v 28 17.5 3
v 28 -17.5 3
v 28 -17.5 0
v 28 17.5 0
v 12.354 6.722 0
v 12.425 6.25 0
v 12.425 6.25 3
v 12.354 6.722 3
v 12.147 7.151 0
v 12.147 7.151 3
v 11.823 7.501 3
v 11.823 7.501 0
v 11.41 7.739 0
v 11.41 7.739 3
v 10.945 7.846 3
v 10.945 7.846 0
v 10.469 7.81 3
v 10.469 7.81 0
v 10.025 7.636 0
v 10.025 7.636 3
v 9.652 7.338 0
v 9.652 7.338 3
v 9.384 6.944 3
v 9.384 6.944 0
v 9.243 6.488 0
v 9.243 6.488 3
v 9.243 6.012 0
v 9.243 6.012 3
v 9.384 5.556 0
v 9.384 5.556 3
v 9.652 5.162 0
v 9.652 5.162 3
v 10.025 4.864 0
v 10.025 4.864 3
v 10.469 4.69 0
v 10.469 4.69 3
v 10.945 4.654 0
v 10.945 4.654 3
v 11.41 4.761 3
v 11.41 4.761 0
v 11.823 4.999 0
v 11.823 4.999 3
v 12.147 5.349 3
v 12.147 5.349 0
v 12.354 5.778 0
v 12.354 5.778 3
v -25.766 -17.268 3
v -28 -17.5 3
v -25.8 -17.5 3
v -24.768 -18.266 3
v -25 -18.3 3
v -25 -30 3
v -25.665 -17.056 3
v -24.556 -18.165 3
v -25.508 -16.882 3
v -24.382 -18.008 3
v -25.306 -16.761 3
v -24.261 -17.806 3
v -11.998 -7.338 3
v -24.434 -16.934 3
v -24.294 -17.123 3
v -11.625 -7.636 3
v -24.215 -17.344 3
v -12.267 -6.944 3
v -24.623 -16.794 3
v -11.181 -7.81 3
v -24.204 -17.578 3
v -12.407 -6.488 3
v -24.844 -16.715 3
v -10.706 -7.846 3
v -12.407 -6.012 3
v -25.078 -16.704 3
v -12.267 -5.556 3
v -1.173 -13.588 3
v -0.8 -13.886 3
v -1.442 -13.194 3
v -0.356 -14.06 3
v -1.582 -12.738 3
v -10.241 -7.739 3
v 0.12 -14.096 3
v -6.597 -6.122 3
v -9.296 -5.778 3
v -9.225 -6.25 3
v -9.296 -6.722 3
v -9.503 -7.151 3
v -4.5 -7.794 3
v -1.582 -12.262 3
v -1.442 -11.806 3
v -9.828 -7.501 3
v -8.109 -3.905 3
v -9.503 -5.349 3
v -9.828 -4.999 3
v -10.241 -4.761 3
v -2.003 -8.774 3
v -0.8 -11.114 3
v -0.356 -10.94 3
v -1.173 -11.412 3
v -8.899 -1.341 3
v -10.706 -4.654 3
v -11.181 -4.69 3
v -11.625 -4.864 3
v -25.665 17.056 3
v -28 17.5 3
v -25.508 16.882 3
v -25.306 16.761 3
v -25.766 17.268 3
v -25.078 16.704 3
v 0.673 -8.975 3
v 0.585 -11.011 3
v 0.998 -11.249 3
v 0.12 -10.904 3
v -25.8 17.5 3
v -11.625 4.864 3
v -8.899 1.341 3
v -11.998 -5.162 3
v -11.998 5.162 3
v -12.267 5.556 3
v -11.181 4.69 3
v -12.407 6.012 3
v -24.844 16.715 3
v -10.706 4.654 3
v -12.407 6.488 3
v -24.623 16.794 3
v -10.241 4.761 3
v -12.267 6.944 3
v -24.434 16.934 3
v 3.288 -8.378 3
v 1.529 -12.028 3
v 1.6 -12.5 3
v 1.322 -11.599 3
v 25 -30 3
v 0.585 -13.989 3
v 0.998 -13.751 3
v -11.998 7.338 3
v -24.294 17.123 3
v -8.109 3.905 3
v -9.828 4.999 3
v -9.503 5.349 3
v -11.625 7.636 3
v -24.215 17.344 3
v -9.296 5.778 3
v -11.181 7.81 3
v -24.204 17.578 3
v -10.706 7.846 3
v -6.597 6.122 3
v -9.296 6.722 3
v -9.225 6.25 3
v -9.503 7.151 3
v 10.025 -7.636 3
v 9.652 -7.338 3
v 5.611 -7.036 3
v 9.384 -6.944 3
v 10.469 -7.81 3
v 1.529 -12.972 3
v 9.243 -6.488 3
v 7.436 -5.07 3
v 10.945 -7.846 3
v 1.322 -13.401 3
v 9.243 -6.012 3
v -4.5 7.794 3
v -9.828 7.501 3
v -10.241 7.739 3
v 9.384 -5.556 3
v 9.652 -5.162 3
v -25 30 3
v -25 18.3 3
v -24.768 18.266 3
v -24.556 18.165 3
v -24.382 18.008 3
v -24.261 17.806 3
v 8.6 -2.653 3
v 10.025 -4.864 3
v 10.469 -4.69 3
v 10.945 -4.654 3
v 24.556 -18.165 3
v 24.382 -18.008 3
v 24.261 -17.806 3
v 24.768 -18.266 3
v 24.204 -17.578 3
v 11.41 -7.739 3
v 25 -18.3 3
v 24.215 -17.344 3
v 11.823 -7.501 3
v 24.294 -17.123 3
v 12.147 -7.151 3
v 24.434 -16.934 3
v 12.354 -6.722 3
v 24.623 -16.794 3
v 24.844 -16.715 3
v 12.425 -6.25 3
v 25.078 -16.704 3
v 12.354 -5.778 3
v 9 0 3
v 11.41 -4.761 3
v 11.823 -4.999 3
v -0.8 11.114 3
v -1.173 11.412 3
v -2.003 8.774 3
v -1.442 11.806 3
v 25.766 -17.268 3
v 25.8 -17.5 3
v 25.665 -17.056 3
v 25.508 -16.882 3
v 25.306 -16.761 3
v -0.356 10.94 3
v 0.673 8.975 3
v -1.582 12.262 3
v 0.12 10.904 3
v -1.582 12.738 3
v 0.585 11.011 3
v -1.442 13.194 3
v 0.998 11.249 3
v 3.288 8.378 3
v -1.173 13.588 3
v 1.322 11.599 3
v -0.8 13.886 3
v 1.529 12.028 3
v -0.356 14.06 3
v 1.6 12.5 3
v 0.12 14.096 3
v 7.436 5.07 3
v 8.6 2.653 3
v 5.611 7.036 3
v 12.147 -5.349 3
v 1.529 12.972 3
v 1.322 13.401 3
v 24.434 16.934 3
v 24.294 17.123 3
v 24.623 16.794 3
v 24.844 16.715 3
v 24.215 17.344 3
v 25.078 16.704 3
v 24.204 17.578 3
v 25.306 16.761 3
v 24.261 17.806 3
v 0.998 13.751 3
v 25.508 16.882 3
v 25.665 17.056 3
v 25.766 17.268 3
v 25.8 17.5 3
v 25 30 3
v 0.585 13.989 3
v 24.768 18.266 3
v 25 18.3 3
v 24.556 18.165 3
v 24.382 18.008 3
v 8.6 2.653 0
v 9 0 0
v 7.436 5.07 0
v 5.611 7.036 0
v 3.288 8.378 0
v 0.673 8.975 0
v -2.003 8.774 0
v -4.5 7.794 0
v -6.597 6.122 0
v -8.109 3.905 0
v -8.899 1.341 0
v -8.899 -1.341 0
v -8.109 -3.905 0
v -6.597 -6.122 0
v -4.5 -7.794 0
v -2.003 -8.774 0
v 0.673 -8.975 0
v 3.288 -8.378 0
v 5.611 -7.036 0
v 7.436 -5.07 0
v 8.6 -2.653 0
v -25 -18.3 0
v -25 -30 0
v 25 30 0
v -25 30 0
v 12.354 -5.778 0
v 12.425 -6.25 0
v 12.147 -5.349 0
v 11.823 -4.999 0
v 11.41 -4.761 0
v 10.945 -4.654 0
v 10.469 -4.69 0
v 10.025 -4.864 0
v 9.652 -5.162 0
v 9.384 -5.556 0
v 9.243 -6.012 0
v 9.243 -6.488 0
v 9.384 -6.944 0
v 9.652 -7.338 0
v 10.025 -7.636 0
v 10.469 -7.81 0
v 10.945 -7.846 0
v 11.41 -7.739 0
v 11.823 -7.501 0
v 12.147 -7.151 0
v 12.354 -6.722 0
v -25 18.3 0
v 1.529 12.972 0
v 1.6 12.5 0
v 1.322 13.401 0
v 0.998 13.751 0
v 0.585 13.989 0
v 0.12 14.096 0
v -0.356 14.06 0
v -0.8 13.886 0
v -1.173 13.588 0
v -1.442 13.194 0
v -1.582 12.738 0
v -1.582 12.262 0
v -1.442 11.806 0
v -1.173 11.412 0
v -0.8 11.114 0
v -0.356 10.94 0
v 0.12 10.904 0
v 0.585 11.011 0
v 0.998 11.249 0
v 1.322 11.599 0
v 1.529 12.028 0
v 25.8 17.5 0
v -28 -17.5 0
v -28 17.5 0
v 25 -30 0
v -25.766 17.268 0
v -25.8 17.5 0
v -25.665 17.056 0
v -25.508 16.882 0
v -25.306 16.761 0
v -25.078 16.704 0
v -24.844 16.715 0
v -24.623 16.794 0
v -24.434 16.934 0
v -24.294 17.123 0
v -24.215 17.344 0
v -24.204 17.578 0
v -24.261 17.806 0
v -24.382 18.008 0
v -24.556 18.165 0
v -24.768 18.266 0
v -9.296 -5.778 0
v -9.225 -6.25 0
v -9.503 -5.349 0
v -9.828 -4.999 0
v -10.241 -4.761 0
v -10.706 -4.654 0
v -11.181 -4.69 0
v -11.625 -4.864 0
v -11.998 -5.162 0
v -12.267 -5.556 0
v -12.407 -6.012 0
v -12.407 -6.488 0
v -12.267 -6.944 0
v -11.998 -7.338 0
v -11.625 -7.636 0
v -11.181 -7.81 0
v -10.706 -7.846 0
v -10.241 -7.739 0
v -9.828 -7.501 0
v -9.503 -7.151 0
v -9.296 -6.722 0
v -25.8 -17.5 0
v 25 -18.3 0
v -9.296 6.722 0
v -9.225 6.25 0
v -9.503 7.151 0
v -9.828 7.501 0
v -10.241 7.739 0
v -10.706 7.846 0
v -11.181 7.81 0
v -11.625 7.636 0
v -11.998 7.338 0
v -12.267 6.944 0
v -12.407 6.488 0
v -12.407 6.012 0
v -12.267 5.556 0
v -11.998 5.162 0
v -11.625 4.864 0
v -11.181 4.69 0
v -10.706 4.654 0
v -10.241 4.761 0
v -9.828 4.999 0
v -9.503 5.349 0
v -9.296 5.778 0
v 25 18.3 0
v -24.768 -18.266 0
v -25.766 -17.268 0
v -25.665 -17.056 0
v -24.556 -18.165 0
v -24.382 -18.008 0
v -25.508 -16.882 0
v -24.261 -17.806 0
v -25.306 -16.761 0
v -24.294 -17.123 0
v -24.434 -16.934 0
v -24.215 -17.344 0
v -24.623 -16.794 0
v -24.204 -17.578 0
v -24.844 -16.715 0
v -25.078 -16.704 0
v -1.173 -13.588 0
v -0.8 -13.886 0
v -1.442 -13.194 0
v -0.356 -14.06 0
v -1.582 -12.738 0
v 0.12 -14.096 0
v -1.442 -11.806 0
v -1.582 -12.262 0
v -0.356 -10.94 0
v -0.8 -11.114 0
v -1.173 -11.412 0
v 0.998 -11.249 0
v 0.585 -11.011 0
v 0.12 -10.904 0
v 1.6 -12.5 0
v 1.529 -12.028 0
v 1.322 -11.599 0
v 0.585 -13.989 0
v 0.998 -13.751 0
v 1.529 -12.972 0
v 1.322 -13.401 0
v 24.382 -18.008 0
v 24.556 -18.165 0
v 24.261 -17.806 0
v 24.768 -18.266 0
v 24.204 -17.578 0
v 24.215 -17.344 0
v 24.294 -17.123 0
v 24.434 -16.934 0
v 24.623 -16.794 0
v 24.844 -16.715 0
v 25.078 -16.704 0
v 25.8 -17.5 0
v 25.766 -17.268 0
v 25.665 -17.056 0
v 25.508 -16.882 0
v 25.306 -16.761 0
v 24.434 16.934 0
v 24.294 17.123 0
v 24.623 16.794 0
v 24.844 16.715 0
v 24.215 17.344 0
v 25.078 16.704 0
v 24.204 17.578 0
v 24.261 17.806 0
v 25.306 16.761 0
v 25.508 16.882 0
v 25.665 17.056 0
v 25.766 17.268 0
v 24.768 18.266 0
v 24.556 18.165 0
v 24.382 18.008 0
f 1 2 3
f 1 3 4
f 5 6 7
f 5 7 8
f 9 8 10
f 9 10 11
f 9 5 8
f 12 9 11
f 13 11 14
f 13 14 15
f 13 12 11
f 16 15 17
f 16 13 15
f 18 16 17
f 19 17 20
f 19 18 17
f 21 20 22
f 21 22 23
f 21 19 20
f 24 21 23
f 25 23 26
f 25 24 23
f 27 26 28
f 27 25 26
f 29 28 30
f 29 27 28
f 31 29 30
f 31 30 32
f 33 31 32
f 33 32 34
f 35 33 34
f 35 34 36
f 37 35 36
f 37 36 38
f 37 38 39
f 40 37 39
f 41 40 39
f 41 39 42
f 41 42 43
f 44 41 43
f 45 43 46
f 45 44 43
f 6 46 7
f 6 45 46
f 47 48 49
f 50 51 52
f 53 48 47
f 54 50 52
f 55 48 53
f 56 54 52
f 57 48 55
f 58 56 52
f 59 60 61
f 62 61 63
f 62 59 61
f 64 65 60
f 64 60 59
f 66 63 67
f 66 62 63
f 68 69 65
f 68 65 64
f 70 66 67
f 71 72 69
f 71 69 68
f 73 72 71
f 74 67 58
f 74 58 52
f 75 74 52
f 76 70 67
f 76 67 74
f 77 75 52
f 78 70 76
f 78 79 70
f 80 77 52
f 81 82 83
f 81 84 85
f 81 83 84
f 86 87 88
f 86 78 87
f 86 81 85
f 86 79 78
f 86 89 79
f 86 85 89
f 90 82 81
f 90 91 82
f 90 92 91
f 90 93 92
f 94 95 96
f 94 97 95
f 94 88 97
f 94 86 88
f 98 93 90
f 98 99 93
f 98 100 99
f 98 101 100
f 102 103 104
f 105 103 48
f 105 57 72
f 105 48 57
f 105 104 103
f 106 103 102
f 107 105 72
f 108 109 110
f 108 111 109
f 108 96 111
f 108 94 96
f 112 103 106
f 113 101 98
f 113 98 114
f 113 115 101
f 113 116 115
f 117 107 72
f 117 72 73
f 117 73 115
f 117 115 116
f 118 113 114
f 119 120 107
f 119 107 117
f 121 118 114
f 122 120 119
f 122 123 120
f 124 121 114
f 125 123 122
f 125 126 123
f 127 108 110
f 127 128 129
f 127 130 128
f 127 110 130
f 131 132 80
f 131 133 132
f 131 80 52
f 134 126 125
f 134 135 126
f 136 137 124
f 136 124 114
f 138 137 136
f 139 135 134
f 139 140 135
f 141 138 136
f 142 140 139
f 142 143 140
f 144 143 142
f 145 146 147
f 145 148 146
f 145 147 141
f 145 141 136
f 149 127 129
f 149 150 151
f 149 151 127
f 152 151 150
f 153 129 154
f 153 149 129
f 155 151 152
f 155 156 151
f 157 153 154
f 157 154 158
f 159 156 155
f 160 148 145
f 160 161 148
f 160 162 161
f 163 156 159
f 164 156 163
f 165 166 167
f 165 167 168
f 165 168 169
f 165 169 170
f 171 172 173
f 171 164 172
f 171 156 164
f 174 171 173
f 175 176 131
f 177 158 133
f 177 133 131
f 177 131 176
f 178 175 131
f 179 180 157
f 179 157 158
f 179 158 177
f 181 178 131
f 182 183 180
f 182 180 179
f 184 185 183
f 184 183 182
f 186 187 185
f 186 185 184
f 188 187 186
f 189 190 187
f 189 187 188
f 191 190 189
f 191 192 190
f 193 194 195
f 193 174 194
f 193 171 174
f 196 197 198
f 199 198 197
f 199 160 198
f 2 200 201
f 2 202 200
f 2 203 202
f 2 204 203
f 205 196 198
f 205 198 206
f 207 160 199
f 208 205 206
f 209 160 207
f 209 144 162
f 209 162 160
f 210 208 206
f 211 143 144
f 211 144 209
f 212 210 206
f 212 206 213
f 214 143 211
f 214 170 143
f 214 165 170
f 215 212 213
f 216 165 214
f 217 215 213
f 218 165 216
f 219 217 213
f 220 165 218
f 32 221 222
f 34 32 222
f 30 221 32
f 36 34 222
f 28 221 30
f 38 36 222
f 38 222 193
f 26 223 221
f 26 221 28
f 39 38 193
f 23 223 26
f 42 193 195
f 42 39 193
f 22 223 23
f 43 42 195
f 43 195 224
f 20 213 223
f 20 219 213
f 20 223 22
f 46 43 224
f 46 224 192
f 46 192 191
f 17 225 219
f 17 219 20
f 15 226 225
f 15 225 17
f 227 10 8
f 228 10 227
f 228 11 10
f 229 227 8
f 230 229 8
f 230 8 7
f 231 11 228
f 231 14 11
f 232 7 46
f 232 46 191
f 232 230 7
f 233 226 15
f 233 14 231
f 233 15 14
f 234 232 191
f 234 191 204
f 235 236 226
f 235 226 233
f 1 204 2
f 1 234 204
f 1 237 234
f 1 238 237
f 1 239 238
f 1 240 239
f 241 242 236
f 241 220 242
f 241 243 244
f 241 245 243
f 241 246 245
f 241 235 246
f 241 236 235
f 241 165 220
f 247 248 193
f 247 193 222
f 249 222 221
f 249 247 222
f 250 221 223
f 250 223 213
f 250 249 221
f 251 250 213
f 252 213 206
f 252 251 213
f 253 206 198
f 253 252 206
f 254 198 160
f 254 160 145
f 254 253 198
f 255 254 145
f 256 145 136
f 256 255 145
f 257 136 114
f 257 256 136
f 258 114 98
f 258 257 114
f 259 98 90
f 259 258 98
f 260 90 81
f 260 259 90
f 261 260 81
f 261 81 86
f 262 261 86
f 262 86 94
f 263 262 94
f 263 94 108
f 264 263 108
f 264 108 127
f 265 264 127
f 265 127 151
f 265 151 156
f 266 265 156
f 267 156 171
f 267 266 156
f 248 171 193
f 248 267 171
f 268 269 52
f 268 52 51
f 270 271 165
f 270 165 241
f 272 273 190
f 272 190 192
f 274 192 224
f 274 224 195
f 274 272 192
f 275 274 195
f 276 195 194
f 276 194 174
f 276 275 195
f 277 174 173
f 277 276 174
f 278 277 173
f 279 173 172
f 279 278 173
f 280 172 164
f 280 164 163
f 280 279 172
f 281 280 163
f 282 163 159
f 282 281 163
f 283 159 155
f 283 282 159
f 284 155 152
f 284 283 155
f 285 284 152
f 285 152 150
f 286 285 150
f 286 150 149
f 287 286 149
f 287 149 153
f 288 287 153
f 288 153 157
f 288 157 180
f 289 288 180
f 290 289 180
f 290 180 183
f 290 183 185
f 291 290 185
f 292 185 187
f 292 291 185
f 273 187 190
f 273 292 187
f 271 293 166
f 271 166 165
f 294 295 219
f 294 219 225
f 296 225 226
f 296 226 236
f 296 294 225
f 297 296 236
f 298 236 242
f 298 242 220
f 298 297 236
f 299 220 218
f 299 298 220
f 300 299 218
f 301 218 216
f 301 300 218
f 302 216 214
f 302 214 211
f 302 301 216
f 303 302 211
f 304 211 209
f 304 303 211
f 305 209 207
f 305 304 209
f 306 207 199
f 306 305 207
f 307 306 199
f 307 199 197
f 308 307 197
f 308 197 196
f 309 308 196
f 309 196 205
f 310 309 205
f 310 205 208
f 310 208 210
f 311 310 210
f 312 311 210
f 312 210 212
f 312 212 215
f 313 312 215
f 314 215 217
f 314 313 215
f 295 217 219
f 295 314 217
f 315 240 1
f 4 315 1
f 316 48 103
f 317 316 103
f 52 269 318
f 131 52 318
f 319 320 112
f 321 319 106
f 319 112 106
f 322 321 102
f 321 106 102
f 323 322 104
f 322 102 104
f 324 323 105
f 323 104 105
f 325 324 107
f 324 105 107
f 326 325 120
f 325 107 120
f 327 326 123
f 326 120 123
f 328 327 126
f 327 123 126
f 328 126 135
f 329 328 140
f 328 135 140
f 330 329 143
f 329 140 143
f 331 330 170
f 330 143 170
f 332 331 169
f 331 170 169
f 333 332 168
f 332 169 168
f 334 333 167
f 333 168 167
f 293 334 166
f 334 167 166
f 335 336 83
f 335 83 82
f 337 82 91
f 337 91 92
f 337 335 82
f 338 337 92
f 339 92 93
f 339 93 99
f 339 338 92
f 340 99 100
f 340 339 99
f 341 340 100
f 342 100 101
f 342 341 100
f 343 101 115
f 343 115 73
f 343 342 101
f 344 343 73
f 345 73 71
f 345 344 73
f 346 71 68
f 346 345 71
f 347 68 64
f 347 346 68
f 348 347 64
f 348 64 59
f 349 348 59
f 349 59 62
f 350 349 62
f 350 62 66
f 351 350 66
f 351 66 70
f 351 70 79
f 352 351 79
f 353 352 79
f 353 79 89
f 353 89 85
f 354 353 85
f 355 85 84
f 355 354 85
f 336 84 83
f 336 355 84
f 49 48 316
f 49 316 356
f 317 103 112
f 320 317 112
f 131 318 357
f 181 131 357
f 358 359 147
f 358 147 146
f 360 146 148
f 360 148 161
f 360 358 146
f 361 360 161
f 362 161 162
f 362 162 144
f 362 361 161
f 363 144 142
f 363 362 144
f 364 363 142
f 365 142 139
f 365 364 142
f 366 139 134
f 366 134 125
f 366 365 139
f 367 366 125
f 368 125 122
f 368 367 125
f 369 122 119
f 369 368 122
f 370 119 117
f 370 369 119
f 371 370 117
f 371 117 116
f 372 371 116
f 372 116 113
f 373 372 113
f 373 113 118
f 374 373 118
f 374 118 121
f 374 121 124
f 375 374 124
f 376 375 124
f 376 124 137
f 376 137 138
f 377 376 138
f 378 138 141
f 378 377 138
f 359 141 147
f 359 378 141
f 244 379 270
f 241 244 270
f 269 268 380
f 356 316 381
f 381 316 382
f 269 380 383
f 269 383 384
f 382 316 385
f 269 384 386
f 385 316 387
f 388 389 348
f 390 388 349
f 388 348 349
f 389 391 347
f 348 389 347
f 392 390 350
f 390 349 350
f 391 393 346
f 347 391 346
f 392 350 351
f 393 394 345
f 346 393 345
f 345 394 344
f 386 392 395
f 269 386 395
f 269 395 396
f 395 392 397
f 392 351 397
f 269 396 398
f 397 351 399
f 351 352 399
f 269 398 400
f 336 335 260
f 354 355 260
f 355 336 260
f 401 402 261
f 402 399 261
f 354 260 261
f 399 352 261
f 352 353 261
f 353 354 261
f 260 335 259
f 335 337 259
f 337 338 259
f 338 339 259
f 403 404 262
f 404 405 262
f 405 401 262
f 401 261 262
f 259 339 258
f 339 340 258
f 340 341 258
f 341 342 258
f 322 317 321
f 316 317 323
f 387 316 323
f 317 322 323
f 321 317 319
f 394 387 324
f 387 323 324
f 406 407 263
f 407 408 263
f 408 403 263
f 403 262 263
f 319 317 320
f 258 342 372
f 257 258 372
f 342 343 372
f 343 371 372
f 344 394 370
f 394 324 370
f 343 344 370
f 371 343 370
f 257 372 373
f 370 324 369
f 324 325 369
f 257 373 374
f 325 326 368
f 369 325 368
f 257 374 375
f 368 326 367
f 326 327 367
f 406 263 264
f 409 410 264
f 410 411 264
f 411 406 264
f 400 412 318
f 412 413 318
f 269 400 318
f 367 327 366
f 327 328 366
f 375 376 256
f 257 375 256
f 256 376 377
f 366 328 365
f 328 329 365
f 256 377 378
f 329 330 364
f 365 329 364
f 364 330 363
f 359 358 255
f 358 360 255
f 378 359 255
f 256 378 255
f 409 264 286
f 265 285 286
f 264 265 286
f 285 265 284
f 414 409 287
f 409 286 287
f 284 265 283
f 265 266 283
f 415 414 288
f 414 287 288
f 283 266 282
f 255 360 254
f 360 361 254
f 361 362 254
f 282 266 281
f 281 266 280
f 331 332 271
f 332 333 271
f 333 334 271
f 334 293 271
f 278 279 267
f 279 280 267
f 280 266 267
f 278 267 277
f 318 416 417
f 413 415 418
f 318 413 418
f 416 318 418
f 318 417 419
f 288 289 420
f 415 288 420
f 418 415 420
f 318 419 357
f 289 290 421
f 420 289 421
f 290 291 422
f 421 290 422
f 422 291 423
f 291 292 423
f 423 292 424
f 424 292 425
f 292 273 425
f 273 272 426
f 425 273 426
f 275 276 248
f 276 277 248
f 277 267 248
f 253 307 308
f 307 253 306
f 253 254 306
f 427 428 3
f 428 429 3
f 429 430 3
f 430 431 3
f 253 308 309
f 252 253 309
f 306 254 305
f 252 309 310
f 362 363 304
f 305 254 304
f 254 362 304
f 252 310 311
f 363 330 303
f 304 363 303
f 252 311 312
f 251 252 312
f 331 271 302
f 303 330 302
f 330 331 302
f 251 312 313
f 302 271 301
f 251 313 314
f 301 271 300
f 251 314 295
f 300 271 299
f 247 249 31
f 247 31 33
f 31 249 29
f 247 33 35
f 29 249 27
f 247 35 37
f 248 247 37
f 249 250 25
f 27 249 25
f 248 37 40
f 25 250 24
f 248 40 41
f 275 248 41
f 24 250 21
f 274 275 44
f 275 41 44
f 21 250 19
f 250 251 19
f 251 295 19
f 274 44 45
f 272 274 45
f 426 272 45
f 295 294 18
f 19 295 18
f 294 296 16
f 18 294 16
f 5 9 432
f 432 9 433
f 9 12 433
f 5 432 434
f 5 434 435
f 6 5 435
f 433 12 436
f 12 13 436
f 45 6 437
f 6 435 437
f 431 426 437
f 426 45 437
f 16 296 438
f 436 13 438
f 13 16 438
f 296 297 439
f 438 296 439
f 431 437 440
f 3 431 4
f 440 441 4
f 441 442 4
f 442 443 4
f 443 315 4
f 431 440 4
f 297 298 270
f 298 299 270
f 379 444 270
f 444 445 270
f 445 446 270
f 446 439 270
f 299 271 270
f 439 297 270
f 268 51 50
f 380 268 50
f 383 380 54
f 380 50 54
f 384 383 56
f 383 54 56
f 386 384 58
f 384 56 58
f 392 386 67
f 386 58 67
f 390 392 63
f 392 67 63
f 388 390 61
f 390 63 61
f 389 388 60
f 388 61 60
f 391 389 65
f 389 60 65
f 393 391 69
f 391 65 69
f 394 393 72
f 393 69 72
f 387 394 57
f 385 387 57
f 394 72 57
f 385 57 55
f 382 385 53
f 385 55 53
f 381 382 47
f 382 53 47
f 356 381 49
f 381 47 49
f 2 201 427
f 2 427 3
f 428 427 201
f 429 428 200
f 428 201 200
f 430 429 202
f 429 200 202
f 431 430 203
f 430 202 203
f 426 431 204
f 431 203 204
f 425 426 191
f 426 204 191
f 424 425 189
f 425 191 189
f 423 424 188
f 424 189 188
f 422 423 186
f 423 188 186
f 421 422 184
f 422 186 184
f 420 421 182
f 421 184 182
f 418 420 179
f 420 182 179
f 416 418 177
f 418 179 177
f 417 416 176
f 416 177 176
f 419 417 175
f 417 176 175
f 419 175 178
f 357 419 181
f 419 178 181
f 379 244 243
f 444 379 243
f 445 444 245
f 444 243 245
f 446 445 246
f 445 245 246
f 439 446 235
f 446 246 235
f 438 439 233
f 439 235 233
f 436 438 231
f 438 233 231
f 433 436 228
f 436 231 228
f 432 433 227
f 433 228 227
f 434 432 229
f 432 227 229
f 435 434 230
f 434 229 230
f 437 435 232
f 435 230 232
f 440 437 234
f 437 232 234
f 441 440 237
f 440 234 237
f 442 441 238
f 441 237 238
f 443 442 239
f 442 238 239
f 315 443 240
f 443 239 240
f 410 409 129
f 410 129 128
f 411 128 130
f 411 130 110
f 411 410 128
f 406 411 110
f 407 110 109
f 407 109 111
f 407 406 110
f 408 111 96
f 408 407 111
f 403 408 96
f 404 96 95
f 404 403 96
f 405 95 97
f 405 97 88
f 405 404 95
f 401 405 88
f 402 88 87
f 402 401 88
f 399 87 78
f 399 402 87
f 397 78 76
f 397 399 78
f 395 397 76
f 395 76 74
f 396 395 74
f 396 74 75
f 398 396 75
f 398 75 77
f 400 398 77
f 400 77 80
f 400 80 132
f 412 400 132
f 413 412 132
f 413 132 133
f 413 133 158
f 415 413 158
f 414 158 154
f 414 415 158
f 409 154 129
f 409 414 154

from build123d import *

# Parameters (mm, degrees)
SKETCH1_W           = 50
SKETCH1_H           = 60
SKETCH1_R           = 1.6
SKETCH1_R_2         = 9
BOSS_EXTRUDE1_DEPTH = 3
SKETCH2_W           = 6
SKETCH2_H           = 35
BOSS_EXTRUDE2_DEPTH = 3
SKETCH3_R           = 0.8
CUT_EXTRUDE1_DEPTH  = 42.146081223


with BuildPart() as part:
    # Sketch1 → Boss-Extrude1 (new body)
    with BuildSketch(Plane.XY):
        Rectangle(SKETCH1_W, SKETCH1_H)
        with Locations((0, 12.5)):
            Circle(SKETCH1_R, mode=Mode.SUBTRACT)
        with Locations((10.825317547, 6.25)):
            Circle(SKETCH1_R, mode=Mode.SUBTRACT)
        with Locations((10.825317547, -6.25)):
            Circle(SKETCH1_R, mode=Mode.SUBTRACT)
        with Locations((0, -12.5)):
            Circle(SKETCH1_R, mode=Mode.SUBTRACT)
        with Locations((-10.825317547, -6.25)):
            Circle(SKETCH1_R, mode=Mode.SUBTRACT)
        with Locations((-10.825317547, 6.25)):
            Circle(SKETCH1_R, mode=Mode.SUBTRACT)
        Circle(SKETCH1_R_2, mode=Mode.SUBTRACT)
    extrude(amount=BOSS_EXTRUDE1_DEPTH)

    # Sketch2 → Boss-Extrude2 (add)
    with BuildSketch(Plane.XY.offset(3)):
        with Locations((-25, 0)):
            Rectangle(SKETCH2_W, SKETCH2_H)
        with Locations((25, 0)):
            Rectangle(SKETCH2_W, SKETCH2_H)
    extrude(amount=-BOSS_EXTRUDE2_DEPTH)

    # Sketch3 → Cut-Extrude1 (cut, through all)
    with BuildSketch(Plane.XY.offset(3)):
        with Locations((-25, 17.5)):
            Circle(SKETCH3_R)
        with Locations((-25, -17.5)):
            Circle(SKETCH3_R)
        with Locations((25, 17.5)):
            Circle(SKETCH3_R)
        with Locations((25, -17.5)):
            Circle(SKETCH3_R)
    extrude(amount=-CUT_EXTRUDE1_DEPTH, mode=Mode.SUBTRACT)


solid = part.part
